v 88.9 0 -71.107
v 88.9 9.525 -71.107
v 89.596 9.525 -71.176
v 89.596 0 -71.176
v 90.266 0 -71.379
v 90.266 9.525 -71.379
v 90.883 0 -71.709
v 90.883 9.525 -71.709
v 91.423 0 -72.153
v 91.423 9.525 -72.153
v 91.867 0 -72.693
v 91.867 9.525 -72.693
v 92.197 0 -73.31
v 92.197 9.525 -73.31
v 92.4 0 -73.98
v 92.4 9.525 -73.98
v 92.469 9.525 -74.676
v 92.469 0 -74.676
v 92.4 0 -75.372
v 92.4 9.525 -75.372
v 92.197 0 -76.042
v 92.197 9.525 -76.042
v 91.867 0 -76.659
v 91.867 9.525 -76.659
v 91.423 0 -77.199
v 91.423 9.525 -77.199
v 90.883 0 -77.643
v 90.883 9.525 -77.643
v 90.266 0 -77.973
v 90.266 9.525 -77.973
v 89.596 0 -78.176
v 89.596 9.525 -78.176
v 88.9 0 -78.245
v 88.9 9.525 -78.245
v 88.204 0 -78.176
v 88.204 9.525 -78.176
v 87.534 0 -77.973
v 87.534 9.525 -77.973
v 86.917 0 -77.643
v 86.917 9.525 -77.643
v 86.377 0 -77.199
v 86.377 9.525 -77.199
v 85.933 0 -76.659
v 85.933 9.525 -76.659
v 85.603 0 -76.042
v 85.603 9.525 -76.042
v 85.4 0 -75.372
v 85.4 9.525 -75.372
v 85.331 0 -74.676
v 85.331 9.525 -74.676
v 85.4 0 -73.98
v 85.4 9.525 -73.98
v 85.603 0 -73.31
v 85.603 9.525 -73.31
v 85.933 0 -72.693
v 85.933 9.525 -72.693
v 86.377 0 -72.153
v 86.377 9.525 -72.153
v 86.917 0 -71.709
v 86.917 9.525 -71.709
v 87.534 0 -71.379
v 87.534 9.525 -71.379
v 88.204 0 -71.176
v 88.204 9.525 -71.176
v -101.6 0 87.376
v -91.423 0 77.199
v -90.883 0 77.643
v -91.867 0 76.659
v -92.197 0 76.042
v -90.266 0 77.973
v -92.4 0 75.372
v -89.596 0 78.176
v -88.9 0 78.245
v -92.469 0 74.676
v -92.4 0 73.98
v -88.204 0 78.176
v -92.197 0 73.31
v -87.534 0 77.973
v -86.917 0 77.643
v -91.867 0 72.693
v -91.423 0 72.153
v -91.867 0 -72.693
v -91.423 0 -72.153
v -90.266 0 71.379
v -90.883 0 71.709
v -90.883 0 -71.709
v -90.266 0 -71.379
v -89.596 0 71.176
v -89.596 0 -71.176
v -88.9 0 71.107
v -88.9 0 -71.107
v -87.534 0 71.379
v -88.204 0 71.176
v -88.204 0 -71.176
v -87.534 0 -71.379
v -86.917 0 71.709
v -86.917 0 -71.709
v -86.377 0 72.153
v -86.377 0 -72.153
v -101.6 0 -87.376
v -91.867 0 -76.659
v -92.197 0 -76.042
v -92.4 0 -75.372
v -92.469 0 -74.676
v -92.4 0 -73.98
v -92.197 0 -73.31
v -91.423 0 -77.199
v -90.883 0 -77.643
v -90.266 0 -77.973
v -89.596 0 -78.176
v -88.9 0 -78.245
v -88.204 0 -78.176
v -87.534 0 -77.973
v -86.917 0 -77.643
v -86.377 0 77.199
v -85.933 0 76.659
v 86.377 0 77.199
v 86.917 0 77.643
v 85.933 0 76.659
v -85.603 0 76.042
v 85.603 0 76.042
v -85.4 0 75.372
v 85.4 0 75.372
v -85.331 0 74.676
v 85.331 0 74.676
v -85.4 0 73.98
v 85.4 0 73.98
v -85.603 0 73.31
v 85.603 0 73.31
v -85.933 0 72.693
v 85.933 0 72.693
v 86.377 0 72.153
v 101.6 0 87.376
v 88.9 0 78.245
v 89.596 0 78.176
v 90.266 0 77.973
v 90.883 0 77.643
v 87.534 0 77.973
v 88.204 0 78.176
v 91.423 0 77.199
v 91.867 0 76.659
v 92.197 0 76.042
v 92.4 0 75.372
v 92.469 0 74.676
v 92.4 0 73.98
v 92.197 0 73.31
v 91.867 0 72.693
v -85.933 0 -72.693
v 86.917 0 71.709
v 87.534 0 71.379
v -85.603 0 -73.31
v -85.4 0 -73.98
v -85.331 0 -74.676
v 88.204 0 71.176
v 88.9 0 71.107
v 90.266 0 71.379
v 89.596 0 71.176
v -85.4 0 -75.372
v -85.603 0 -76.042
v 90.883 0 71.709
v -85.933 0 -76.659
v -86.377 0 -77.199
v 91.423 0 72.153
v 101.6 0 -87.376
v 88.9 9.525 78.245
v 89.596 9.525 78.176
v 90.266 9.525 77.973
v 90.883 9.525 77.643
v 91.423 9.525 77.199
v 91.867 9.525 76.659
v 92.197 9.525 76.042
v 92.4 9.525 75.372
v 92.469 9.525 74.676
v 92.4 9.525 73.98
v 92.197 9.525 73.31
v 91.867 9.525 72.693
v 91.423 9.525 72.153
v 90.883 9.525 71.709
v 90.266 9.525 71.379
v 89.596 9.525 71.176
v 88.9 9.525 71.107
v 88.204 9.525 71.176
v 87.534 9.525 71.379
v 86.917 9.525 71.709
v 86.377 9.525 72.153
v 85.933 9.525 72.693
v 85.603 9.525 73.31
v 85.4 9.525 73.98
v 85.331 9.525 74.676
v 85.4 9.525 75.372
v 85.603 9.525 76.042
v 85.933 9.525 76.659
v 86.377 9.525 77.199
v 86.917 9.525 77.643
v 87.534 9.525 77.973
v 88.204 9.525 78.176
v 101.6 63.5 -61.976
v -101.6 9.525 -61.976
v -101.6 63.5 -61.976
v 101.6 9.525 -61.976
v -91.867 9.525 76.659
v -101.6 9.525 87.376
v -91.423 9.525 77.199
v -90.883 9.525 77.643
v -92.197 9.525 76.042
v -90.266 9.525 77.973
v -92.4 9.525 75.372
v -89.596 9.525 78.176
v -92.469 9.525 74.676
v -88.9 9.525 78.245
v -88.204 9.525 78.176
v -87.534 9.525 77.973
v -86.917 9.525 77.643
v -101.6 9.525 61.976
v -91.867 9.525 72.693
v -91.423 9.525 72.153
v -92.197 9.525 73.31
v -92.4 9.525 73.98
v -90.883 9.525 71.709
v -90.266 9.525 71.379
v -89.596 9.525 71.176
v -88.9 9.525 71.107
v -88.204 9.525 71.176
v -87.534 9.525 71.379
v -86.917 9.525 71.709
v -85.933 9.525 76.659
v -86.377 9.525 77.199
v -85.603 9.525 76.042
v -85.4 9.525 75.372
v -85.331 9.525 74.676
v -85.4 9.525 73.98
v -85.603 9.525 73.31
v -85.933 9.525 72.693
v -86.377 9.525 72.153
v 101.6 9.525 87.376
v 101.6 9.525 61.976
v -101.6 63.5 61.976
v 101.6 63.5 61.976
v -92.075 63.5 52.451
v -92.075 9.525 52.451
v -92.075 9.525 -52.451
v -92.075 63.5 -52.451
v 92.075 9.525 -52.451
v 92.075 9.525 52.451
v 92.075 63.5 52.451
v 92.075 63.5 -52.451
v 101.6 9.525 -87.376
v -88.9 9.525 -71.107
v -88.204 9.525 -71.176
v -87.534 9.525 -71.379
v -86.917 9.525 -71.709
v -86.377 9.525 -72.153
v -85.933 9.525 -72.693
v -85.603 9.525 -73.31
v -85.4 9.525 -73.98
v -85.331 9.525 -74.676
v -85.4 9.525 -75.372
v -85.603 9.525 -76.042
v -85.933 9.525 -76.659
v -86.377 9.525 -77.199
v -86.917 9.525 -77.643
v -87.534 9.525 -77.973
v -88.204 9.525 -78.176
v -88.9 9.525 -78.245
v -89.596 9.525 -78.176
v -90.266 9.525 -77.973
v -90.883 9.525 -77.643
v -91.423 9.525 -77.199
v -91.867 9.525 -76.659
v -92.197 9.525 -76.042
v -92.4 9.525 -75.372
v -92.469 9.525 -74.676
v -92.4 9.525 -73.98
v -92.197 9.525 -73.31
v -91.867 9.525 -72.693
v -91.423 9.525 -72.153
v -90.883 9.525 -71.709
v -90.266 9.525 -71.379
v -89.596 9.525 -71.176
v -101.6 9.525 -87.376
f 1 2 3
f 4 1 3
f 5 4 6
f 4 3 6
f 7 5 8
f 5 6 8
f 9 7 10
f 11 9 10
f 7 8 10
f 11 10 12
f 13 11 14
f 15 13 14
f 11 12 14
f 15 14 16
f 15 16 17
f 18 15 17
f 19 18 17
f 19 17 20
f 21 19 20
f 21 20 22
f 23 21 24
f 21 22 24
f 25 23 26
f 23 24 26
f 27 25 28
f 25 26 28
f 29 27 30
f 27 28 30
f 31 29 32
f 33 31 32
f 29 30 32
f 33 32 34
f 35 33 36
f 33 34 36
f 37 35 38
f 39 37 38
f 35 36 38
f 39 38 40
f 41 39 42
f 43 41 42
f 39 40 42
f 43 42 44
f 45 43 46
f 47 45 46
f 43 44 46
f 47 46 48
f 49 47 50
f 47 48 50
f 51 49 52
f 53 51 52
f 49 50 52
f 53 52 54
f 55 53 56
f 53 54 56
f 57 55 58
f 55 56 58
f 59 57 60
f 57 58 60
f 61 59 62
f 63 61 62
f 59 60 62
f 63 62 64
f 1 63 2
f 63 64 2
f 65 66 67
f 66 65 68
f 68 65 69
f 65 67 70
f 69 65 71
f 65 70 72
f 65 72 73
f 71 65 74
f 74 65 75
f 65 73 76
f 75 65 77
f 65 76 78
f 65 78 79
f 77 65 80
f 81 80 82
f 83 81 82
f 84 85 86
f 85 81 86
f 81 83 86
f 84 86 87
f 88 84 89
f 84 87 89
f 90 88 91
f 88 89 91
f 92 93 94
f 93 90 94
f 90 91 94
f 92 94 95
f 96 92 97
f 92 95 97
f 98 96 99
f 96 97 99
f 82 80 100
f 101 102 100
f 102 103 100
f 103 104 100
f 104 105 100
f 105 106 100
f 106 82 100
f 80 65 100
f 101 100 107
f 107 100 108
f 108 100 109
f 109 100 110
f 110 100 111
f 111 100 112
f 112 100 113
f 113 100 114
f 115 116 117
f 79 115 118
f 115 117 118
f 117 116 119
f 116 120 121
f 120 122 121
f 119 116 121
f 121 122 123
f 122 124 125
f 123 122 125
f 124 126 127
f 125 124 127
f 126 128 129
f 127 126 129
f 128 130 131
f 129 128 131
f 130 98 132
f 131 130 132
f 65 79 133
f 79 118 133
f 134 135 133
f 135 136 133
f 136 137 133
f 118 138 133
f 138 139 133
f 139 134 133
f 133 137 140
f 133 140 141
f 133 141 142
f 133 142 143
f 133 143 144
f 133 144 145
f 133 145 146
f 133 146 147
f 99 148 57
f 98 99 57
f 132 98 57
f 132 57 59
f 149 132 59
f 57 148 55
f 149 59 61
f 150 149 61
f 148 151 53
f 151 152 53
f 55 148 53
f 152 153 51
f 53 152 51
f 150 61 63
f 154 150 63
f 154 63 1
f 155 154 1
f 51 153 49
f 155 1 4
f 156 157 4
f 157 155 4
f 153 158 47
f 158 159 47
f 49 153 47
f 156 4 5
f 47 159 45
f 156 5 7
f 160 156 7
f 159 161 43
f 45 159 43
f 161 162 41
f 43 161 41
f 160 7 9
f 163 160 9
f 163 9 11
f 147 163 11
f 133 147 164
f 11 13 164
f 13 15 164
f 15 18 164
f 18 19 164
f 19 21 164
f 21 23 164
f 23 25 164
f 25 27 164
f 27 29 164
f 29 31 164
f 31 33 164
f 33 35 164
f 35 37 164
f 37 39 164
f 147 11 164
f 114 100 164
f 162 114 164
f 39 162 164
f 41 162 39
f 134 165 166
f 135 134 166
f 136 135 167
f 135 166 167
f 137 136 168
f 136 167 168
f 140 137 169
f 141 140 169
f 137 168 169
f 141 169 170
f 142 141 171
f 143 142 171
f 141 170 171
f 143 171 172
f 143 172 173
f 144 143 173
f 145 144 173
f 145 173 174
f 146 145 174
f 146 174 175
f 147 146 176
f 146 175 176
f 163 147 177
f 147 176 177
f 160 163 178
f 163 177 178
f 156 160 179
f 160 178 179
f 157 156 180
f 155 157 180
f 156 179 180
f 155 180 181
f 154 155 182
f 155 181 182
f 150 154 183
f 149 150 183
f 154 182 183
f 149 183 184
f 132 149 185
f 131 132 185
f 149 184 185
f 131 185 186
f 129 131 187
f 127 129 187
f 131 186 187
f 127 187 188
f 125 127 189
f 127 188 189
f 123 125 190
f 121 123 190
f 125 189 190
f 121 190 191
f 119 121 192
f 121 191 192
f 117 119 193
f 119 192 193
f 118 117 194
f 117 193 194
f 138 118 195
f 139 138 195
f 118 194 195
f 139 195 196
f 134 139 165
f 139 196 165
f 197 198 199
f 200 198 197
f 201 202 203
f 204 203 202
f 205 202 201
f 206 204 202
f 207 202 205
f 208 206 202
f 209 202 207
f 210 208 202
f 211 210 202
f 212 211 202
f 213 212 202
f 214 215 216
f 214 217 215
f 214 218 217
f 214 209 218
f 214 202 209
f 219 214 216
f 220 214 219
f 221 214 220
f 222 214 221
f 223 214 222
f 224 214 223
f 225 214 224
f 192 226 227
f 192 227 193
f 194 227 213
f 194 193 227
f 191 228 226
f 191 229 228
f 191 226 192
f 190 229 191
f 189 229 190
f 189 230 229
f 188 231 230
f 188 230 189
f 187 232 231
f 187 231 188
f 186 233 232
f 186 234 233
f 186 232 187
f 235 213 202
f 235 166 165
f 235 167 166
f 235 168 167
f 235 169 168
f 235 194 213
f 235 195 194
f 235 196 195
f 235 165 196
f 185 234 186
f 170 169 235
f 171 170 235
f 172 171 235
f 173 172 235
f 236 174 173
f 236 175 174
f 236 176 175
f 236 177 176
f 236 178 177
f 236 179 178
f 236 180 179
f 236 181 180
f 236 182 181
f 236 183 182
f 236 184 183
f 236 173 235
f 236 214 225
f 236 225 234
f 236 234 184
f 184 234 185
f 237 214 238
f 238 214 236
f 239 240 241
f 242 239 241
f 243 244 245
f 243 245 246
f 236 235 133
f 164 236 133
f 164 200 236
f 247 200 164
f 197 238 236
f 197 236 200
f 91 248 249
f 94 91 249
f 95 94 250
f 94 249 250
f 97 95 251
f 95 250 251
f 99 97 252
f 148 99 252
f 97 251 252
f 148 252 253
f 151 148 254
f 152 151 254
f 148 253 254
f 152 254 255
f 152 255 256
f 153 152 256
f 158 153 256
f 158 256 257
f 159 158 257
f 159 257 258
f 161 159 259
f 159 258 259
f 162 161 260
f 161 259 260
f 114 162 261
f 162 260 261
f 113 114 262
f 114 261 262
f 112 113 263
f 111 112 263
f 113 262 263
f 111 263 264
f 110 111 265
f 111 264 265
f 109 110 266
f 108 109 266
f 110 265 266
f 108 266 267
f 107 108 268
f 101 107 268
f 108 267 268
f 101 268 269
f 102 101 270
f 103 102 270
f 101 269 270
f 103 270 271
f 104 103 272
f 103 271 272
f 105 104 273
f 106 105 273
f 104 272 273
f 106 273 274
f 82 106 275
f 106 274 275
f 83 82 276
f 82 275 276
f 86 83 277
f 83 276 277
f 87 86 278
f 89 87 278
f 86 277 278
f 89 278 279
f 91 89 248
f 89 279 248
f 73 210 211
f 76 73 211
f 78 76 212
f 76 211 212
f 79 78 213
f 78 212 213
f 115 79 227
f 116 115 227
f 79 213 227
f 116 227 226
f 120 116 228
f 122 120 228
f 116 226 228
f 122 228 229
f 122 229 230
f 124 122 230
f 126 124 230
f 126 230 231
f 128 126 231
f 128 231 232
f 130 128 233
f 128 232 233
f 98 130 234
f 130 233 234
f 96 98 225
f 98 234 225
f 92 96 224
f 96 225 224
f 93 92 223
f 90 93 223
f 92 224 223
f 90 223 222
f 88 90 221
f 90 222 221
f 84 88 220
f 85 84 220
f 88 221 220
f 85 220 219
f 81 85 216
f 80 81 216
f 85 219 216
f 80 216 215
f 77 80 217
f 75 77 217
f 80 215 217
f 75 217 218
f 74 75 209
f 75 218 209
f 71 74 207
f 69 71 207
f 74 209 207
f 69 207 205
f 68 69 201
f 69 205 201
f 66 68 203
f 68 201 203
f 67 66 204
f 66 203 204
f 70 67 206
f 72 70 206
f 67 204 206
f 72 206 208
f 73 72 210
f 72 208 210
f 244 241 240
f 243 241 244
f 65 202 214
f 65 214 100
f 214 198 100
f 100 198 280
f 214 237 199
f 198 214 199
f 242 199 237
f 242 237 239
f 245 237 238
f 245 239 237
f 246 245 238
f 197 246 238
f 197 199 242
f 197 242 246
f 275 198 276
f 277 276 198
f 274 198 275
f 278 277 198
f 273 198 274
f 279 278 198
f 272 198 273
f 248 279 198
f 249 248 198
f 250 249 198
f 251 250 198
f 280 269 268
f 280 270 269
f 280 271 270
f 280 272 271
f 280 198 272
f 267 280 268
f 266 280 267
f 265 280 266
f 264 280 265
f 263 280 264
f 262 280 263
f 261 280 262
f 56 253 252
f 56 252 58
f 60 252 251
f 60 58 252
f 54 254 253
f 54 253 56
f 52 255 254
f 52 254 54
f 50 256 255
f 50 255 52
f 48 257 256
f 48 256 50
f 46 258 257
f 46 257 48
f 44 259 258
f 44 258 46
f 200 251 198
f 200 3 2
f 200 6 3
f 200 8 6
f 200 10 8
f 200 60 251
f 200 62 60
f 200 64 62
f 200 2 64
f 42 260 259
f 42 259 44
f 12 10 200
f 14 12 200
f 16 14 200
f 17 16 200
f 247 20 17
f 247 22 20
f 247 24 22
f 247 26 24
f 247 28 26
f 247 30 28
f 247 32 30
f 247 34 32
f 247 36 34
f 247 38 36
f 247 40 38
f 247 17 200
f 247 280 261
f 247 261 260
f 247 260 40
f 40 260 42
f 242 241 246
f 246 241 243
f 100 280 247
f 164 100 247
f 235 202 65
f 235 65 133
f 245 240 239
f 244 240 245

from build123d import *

# Parameters (mm, degrees)
SKETCH2_W              = 203.2
SKETCH2_H              = 123.952
MAIN_BLOCK_DEPTH       = 63.5
SHELL_T                = -9.525
SKETCH6_W              = 203.2
SKETCH6_H              = 25.4
SKETCH6_R              = 3.5687
MOUNTING_FLANGES_DEPTH = 9.525


with BuildPart() as part:
    # Sketch2 → Main Block (new body)
    with BuildSketch(Plane(origin=(0, 0, 0), x_dir=(1, 0, 0), z_dir=(0, 1, 0))):
        Rectangle(SKETCH2_W, SKETCH2_H)
    extrude(amount=MAIN_BLOCK_DEPTH)

    # Shell
    shell_openings = [part.faces().sort_by_distance(p)[0] for p in [
        (0, 63.5, 0),
    ]]
    offset(amount=SHELL_T, openings=shell_openings, kind=Kind.INTERSECTION)

    # Sketch6 → Mounting Flanges (add)
    # profile 1 of 2: a face of its own
    with BuildSketch(Plane(origin=(0, 9.525, 0), x_dir=(1, 0, 0), z_dir=(0, 1, 0))):
        with Locations((0, 74.676)):
            Rectangle(SKETCH6_W, SKETCH6_H)
        with Locations(Location((-88.9, 74.676, 0), (0, 0, 270))):
            Circle(SKETCH6_R, mode=Mode.SUBTRACT)
        with Locations(Location((88.9, 74.676, 0), (0, 0, 270))):
            Circle(SKETCH6_R, mode=Mode.SUBTRACT)
    # profile 2 of 2: a face of its own
    with BuildSketch(Plane(origin=(0, 9.525, 0), x_dir=(1, 0, 0), z_dir=(0, 1, 0))):
        with Locations((0, -74.676)):
            Rectangle(SKETCH6_W, SKETCH6_H)
        with Locations(Location((88.9, -74.676, 0), (0, 0, 270))):
            Circle(SKETCH6_R, mode=Mode.SUBTRACT)
        with Locations(Location((-88.9, -74.676, 0), (0, 0, 270))):
            Circle(SKETCH6_R, mode=Mode.SUBTRACT)
    extrude(amount=-MOUNTING_FLANGES_DEPTH)


solid = part.part
